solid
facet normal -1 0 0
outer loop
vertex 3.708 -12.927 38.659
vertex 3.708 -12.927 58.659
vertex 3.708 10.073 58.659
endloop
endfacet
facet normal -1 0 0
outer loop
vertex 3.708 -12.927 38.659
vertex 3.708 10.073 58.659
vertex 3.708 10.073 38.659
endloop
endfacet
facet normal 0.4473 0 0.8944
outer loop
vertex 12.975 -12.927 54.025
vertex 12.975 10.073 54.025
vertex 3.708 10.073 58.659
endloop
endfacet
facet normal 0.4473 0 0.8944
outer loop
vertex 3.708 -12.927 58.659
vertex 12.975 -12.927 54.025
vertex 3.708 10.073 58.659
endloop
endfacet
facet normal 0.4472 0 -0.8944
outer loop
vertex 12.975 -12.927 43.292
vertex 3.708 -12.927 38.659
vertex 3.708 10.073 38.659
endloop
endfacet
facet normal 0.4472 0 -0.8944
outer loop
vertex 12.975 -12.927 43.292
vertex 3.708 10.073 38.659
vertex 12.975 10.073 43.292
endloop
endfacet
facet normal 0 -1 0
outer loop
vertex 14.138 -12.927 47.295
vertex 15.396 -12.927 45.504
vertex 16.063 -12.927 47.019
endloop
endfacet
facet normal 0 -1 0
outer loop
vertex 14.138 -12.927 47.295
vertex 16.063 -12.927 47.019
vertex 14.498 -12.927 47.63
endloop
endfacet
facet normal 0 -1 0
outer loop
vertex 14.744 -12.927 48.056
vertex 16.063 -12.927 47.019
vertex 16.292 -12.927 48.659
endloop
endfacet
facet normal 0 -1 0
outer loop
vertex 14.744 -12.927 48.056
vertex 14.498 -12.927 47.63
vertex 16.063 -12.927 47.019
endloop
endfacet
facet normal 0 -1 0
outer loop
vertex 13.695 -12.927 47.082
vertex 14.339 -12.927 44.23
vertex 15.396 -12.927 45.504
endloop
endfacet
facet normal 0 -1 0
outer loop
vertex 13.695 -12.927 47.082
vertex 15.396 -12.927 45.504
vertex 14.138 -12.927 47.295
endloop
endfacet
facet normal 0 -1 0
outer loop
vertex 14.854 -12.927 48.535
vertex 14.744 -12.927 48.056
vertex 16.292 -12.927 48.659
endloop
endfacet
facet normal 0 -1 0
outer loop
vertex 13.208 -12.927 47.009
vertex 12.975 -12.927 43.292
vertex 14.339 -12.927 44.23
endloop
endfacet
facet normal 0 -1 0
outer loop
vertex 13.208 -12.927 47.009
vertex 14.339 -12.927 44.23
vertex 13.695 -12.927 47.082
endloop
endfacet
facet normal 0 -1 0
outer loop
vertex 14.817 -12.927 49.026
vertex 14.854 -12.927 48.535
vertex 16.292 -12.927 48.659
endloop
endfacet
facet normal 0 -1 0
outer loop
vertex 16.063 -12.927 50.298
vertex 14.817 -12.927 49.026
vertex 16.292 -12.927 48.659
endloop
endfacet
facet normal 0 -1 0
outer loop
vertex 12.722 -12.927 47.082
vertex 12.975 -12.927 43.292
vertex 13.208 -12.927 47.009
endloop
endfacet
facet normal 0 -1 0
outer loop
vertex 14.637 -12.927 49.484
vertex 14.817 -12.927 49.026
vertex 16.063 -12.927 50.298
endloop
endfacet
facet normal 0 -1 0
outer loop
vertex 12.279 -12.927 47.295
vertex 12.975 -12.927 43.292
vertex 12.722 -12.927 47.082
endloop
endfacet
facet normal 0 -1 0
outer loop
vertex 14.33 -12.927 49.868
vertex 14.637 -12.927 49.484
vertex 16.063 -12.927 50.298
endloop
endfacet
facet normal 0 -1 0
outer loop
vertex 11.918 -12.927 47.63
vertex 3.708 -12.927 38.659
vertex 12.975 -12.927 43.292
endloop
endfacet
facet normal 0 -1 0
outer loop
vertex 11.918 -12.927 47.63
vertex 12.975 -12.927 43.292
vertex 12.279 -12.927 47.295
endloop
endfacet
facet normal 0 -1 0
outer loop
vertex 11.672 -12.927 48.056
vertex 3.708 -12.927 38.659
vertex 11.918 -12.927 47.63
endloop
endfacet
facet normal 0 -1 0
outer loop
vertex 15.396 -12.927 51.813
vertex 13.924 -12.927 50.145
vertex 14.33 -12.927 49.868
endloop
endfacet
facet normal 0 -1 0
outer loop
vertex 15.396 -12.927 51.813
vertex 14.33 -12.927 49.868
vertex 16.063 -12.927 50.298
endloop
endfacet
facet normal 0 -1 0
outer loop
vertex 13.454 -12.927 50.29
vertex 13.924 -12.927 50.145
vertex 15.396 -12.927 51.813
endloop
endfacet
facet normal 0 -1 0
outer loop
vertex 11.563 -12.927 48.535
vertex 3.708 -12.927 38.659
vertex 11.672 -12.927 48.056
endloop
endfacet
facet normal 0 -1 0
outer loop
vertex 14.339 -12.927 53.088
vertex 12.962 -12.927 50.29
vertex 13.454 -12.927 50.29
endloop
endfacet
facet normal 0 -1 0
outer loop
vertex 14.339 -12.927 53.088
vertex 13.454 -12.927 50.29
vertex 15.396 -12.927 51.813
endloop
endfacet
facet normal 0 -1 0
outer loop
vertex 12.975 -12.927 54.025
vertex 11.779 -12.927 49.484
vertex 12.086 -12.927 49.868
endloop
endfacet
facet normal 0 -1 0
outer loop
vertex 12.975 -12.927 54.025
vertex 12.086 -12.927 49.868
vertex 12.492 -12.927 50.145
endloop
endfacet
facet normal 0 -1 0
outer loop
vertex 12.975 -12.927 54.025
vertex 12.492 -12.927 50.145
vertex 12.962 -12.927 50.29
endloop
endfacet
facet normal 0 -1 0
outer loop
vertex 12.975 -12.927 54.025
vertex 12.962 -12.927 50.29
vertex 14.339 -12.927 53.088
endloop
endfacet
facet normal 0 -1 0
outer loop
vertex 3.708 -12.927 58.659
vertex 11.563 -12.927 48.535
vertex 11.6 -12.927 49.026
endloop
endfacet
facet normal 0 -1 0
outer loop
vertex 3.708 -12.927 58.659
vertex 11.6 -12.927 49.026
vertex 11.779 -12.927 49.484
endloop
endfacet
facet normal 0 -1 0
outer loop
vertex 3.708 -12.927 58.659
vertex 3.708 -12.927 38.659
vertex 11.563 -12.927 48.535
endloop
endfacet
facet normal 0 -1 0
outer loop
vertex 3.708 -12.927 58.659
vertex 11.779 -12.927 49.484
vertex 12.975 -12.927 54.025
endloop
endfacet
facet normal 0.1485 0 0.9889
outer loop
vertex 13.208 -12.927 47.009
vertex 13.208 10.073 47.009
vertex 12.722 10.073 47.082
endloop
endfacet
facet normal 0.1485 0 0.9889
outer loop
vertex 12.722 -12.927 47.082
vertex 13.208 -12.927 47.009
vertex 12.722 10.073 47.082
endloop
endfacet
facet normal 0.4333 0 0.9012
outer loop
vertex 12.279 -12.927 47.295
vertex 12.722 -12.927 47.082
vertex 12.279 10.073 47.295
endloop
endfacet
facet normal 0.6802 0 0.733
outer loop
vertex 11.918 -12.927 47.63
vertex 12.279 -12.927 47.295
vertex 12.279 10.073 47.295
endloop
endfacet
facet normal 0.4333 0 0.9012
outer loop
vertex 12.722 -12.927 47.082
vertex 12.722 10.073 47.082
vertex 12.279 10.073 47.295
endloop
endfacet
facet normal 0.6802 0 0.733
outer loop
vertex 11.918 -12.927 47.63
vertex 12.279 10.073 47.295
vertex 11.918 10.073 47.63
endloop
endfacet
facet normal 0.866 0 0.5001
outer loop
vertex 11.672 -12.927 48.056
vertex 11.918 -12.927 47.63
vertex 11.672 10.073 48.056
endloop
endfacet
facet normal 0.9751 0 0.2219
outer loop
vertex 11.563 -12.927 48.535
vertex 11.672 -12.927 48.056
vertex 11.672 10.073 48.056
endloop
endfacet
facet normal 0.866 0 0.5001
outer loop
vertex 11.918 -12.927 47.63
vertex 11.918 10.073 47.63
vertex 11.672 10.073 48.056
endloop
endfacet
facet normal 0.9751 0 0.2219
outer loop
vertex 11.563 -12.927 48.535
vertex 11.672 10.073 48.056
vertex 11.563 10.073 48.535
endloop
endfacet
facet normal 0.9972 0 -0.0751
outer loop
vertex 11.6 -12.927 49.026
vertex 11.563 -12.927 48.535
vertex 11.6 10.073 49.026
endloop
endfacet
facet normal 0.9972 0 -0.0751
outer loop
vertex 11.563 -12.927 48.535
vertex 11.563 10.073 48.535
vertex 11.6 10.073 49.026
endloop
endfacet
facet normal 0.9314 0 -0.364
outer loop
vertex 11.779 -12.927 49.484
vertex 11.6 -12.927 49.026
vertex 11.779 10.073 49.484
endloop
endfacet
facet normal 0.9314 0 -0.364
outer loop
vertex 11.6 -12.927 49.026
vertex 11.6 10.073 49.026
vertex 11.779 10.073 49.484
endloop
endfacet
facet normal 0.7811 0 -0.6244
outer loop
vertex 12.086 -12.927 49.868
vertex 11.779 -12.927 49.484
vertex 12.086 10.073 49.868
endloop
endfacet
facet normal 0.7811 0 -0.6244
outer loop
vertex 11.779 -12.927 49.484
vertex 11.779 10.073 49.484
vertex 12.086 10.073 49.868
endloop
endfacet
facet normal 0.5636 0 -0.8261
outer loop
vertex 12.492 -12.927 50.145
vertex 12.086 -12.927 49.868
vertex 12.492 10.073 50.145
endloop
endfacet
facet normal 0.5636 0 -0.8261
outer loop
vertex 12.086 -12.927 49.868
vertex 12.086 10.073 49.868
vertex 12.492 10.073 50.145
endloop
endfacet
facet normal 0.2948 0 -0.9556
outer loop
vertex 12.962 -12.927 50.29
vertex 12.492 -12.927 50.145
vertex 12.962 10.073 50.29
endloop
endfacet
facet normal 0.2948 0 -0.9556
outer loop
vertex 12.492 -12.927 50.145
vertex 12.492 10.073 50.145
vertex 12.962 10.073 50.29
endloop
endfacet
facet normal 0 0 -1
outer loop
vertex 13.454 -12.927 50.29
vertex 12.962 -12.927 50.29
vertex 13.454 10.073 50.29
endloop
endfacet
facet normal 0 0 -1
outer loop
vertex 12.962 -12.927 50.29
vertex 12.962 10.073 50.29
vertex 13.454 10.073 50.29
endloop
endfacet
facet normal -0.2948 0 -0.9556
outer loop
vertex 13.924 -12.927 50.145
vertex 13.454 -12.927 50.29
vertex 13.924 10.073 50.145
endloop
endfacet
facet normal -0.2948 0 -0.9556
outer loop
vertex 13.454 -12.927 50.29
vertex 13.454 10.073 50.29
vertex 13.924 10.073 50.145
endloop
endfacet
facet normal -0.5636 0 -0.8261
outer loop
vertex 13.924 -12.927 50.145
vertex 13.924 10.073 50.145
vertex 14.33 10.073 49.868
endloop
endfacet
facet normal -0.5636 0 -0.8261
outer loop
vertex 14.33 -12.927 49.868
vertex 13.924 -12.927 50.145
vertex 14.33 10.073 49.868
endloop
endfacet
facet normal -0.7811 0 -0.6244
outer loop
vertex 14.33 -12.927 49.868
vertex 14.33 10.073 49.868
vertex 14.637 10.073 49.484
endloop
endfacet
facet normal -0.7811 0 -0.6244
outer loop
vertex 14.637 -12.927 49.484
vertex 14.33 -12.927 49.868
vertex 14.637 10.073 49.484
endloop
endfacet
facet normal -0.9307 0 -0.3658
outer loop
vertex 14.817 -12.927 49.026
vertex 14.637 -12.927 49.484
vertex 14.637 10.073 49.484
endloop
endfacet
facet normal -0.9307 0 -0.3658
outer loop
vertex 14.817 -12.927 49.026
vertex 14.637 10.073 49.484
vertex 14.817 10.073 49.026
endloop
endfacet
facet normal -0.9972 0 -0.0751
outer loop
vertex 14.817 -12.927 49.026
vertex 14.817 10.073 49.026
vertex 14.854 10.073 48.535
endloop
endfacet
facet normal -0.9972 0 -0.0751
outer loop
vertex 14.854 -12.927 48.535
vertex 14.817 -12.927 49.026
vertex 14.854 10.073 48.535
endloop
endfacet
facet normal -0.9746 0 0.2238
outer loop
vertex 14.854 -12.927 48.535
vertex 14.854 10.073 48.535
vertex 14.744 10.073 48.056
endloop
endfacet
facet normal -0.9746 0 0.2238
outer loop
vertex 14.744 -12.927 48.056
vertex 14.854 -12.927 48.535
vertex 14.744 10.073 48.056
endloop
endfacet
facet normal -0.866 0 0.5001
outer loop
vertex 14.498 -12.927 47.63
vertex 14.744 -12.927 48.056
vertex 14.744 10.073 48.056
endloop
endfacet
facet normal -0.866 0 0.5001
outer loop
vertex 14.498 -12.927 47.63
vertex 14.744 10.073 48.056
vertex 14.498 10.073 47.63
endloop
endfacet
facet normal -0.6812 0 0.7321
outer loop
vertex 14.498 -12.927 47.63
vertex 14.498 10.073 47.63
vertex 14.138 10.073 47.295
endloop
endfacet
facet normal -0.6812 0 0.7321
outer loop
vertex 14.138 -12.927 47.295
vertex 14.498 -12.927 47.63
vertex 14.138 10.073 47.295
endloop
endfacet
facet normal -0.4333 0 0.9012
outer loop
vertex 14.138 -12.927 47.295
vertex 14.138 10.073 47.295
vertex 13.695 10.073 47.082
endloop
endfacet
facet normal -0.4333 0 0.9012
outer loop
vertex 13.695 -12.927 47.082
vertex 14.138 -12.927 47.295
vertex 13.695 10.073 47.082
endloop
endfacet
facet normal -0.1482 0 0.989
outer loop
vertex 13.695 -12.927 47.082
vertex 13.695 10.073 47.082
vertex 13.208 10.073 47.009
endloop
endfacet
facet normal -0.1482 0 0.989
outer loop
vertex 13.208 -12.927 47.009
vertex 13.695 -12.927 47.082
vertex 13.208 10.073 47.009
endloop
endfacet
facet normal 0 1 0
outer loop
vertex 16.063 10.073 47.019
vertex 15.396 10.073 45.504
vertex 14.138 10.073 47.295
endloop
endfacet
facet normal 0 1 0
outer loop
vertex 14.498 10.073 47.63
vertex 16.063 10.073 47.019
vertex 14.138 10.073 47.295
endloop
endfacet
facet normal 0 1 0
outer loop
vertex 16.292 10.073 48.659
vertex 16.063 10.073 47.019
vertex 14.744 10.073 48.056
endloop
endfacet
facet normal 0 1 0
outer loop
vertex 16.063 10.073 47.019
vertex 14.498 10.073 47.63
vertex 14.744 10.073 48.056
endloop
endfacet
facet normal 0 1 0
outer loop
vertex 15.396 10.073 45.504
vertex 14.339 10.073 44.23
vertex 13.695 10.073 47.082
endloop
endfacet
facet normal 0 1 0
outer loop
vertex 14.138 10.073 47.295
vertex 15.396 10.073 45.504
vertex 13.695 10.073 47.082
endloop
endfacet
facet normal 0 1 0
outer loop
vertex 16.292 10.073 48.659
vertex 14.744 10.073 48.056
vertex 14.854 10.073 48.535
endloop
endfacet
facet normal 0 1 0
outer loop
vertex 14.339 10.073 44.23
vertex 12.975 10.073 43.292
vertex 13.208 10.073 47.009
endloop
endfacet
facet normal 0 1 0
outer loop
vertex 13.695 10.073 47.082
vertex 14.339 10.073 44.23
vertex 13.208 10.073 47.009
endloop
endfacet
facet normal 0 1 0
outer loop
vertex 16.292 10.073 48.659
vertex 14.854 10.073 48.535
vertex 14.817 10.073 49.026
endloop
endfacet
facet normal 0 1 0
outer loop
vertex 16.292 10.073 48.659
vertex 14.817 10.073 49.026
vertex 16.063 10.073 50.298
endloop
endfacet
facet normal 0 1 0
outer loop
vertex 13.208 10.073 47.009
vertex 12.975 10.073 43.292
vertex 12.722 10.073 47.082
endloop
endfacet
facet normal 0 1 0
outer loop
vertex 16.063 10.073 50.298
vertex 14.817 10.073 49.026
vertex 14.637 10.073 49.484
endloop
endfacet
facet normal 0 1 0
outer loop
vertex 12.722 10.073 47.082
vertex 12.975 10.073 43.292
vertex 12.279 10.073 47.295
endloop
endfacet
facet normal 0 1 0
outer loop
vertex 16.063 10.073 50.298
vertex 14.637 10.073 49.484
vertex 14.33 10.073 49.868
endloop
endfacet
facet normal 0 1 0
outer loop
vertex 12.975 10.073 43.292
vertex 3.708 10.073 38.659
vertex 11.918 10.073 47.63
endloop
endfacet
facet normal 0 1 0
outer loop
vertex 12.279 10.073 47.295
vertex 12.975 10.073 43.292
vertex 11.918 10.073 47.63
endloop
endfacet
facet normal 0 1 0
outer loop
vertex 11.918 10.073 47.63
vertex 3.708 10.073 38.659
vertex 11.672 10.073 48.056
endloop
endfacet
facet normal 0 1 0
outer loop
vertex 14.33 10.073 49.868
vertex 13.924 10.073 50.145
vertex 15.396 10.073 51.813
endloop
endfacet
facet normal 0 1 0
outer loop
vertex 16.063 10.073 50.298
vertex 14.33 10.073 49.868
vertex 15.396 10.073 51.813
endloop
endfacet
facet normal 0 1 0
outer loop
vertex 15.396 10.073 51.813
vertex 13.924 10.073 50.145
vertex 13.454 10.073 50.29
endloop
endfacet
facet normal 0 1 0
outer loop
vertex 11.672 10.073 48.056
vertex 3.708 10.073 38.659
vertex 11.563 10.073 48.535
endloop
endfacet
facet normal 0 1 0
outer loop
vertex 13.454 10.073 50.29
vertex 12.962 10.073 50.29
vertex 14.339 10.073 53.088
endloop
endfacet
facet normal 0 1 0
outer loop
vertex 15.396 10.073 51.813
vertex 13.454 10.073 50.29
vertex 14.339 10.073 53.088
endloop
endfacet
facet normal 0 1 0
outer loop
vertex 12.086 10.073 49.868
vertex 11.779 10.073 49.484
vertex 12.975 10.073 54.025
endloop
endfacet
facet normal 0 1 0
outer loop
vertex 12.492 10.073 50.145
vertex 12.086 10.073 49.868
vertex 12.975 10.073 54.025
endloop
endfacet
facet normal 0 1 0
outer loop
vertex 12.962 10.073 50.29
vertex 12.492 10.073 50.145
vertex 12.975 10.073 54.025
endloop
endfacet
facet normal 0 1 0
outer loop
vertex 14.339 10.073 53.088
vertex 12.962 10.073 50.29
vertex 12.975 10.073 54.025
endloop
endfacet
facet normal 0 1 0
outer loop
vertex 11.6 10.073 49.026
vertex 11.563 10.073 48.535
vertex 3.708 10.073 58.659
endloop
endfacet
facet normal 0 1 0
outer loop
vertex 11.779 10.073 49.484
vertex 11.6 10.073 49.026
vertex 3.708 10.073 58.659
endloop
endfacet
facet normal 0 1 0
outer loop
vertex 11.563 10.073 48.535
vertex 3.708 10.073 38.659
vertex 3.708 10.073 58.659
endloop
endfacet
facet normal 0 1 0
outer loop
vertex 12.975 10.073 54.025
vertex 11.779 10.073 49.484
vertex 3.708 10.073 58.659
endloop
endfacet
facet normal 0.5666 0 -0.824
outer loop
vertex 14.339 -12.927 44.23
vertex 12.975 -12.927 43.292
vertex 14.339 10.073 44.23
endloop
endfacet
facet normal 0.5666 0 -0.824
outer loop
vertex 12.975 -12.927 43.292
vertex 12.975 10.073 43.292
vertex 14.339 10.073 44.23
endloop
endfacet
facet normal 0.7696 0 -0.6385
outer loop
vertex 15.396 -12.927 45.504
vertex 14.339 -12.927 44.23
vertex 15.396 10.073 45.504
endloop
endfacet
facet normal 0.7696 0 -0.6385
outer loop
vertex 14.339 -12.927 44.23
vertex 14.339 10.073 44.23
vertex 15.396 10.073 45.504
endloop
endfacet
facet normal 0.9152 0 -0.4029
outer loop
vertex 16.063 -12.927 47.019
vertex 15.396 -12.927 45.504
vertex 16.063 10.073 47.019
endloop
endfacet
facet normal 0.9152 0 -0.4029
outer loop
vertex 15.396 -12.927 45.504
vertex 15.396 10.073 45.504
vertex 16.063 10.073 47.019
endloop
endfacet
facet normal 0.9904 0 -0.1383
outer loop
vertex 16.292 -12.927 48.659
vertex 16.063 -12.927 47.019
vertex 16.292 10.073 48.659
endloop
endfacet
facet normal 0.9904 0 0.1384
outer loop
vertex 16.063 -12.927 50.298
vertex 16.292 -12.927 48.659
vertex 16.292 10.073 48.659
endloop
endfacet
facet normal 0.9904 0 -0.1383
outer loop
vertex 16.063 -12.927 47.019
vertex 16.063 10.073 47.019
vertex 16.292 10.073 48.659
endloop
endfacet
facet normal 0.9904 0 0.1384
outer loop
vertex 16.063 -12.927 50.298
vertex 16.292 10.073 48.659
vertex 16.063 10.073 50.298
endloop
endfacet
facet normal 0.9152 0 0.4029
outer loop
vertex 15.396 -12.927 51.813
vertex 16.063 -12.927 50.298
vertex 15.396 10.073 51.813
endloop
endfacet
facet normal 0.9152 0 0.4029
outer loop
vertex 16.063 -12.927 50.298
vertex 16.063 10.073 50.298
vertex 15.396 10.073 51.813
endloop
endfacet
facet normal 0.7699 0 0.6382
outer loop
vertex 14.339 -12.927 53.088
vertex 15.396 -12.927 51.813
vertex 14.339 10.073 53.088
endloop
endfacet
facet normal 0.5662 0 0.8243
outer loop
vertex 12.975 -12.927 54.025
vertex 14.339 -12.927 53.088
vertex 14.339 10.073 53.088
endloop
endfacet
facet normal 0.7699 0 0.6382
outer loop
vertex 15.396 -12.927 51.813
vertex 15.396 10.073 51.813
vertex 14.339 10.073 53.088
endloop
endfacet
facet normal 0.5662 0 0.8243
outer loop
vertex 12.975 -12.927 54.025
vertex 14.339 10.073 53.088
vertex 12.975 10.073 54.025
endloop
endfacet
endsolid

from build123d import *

# Parameters (mm, degrees)
BOSS_EXTRUDE1_DEPTH         = 23
FILLET1_R                   = 6
PREFORO_DA_MASCHIARE_M4_1_D = 3.3
BODY_MOVE_COPY1_ANGLE       = 90


with BuildPart() as part:
    # Sketch2 → Boss-Extrude1 (new body)
    with BuildSketch(Plane(origin=(0, 0, 0), x_dir=(0, 0, -1), z_dir=(1, 0, 0))):
        Polygon((-58.658771552, 3.364610889), (-38.658771552, 3.364610889), (-48.658771552, -16.635389111), align=None)
    extrude(amount=BOSS_EXTRUDE1_DEPTH)

    # Fillet1
    fillet1_edges = [part.edges().sort_by_distance(p)[0] for p in [
        (11.5, -16.635389111, 48.658771552),
    ]]
    fillet(fillet1_edges, radius=FILLET1_R)

    # Preforo da maschiare M4-1 (through all)
    with Locations(Plane.ZY):
        with Locations((48.658771552, -6.135389111)):
            Hole(PREFORO_DA_MASCHIARE_M4_1_D / 2)


with BuildPart() as part_1:
    # Body-Move/Copy1: moved
    add(part.part.rotate(Axis((10, -2.927185179, 0), (0, 0, 1)), BODY_MOVE_COPY1_ANGLE))


solid = part_1.part
